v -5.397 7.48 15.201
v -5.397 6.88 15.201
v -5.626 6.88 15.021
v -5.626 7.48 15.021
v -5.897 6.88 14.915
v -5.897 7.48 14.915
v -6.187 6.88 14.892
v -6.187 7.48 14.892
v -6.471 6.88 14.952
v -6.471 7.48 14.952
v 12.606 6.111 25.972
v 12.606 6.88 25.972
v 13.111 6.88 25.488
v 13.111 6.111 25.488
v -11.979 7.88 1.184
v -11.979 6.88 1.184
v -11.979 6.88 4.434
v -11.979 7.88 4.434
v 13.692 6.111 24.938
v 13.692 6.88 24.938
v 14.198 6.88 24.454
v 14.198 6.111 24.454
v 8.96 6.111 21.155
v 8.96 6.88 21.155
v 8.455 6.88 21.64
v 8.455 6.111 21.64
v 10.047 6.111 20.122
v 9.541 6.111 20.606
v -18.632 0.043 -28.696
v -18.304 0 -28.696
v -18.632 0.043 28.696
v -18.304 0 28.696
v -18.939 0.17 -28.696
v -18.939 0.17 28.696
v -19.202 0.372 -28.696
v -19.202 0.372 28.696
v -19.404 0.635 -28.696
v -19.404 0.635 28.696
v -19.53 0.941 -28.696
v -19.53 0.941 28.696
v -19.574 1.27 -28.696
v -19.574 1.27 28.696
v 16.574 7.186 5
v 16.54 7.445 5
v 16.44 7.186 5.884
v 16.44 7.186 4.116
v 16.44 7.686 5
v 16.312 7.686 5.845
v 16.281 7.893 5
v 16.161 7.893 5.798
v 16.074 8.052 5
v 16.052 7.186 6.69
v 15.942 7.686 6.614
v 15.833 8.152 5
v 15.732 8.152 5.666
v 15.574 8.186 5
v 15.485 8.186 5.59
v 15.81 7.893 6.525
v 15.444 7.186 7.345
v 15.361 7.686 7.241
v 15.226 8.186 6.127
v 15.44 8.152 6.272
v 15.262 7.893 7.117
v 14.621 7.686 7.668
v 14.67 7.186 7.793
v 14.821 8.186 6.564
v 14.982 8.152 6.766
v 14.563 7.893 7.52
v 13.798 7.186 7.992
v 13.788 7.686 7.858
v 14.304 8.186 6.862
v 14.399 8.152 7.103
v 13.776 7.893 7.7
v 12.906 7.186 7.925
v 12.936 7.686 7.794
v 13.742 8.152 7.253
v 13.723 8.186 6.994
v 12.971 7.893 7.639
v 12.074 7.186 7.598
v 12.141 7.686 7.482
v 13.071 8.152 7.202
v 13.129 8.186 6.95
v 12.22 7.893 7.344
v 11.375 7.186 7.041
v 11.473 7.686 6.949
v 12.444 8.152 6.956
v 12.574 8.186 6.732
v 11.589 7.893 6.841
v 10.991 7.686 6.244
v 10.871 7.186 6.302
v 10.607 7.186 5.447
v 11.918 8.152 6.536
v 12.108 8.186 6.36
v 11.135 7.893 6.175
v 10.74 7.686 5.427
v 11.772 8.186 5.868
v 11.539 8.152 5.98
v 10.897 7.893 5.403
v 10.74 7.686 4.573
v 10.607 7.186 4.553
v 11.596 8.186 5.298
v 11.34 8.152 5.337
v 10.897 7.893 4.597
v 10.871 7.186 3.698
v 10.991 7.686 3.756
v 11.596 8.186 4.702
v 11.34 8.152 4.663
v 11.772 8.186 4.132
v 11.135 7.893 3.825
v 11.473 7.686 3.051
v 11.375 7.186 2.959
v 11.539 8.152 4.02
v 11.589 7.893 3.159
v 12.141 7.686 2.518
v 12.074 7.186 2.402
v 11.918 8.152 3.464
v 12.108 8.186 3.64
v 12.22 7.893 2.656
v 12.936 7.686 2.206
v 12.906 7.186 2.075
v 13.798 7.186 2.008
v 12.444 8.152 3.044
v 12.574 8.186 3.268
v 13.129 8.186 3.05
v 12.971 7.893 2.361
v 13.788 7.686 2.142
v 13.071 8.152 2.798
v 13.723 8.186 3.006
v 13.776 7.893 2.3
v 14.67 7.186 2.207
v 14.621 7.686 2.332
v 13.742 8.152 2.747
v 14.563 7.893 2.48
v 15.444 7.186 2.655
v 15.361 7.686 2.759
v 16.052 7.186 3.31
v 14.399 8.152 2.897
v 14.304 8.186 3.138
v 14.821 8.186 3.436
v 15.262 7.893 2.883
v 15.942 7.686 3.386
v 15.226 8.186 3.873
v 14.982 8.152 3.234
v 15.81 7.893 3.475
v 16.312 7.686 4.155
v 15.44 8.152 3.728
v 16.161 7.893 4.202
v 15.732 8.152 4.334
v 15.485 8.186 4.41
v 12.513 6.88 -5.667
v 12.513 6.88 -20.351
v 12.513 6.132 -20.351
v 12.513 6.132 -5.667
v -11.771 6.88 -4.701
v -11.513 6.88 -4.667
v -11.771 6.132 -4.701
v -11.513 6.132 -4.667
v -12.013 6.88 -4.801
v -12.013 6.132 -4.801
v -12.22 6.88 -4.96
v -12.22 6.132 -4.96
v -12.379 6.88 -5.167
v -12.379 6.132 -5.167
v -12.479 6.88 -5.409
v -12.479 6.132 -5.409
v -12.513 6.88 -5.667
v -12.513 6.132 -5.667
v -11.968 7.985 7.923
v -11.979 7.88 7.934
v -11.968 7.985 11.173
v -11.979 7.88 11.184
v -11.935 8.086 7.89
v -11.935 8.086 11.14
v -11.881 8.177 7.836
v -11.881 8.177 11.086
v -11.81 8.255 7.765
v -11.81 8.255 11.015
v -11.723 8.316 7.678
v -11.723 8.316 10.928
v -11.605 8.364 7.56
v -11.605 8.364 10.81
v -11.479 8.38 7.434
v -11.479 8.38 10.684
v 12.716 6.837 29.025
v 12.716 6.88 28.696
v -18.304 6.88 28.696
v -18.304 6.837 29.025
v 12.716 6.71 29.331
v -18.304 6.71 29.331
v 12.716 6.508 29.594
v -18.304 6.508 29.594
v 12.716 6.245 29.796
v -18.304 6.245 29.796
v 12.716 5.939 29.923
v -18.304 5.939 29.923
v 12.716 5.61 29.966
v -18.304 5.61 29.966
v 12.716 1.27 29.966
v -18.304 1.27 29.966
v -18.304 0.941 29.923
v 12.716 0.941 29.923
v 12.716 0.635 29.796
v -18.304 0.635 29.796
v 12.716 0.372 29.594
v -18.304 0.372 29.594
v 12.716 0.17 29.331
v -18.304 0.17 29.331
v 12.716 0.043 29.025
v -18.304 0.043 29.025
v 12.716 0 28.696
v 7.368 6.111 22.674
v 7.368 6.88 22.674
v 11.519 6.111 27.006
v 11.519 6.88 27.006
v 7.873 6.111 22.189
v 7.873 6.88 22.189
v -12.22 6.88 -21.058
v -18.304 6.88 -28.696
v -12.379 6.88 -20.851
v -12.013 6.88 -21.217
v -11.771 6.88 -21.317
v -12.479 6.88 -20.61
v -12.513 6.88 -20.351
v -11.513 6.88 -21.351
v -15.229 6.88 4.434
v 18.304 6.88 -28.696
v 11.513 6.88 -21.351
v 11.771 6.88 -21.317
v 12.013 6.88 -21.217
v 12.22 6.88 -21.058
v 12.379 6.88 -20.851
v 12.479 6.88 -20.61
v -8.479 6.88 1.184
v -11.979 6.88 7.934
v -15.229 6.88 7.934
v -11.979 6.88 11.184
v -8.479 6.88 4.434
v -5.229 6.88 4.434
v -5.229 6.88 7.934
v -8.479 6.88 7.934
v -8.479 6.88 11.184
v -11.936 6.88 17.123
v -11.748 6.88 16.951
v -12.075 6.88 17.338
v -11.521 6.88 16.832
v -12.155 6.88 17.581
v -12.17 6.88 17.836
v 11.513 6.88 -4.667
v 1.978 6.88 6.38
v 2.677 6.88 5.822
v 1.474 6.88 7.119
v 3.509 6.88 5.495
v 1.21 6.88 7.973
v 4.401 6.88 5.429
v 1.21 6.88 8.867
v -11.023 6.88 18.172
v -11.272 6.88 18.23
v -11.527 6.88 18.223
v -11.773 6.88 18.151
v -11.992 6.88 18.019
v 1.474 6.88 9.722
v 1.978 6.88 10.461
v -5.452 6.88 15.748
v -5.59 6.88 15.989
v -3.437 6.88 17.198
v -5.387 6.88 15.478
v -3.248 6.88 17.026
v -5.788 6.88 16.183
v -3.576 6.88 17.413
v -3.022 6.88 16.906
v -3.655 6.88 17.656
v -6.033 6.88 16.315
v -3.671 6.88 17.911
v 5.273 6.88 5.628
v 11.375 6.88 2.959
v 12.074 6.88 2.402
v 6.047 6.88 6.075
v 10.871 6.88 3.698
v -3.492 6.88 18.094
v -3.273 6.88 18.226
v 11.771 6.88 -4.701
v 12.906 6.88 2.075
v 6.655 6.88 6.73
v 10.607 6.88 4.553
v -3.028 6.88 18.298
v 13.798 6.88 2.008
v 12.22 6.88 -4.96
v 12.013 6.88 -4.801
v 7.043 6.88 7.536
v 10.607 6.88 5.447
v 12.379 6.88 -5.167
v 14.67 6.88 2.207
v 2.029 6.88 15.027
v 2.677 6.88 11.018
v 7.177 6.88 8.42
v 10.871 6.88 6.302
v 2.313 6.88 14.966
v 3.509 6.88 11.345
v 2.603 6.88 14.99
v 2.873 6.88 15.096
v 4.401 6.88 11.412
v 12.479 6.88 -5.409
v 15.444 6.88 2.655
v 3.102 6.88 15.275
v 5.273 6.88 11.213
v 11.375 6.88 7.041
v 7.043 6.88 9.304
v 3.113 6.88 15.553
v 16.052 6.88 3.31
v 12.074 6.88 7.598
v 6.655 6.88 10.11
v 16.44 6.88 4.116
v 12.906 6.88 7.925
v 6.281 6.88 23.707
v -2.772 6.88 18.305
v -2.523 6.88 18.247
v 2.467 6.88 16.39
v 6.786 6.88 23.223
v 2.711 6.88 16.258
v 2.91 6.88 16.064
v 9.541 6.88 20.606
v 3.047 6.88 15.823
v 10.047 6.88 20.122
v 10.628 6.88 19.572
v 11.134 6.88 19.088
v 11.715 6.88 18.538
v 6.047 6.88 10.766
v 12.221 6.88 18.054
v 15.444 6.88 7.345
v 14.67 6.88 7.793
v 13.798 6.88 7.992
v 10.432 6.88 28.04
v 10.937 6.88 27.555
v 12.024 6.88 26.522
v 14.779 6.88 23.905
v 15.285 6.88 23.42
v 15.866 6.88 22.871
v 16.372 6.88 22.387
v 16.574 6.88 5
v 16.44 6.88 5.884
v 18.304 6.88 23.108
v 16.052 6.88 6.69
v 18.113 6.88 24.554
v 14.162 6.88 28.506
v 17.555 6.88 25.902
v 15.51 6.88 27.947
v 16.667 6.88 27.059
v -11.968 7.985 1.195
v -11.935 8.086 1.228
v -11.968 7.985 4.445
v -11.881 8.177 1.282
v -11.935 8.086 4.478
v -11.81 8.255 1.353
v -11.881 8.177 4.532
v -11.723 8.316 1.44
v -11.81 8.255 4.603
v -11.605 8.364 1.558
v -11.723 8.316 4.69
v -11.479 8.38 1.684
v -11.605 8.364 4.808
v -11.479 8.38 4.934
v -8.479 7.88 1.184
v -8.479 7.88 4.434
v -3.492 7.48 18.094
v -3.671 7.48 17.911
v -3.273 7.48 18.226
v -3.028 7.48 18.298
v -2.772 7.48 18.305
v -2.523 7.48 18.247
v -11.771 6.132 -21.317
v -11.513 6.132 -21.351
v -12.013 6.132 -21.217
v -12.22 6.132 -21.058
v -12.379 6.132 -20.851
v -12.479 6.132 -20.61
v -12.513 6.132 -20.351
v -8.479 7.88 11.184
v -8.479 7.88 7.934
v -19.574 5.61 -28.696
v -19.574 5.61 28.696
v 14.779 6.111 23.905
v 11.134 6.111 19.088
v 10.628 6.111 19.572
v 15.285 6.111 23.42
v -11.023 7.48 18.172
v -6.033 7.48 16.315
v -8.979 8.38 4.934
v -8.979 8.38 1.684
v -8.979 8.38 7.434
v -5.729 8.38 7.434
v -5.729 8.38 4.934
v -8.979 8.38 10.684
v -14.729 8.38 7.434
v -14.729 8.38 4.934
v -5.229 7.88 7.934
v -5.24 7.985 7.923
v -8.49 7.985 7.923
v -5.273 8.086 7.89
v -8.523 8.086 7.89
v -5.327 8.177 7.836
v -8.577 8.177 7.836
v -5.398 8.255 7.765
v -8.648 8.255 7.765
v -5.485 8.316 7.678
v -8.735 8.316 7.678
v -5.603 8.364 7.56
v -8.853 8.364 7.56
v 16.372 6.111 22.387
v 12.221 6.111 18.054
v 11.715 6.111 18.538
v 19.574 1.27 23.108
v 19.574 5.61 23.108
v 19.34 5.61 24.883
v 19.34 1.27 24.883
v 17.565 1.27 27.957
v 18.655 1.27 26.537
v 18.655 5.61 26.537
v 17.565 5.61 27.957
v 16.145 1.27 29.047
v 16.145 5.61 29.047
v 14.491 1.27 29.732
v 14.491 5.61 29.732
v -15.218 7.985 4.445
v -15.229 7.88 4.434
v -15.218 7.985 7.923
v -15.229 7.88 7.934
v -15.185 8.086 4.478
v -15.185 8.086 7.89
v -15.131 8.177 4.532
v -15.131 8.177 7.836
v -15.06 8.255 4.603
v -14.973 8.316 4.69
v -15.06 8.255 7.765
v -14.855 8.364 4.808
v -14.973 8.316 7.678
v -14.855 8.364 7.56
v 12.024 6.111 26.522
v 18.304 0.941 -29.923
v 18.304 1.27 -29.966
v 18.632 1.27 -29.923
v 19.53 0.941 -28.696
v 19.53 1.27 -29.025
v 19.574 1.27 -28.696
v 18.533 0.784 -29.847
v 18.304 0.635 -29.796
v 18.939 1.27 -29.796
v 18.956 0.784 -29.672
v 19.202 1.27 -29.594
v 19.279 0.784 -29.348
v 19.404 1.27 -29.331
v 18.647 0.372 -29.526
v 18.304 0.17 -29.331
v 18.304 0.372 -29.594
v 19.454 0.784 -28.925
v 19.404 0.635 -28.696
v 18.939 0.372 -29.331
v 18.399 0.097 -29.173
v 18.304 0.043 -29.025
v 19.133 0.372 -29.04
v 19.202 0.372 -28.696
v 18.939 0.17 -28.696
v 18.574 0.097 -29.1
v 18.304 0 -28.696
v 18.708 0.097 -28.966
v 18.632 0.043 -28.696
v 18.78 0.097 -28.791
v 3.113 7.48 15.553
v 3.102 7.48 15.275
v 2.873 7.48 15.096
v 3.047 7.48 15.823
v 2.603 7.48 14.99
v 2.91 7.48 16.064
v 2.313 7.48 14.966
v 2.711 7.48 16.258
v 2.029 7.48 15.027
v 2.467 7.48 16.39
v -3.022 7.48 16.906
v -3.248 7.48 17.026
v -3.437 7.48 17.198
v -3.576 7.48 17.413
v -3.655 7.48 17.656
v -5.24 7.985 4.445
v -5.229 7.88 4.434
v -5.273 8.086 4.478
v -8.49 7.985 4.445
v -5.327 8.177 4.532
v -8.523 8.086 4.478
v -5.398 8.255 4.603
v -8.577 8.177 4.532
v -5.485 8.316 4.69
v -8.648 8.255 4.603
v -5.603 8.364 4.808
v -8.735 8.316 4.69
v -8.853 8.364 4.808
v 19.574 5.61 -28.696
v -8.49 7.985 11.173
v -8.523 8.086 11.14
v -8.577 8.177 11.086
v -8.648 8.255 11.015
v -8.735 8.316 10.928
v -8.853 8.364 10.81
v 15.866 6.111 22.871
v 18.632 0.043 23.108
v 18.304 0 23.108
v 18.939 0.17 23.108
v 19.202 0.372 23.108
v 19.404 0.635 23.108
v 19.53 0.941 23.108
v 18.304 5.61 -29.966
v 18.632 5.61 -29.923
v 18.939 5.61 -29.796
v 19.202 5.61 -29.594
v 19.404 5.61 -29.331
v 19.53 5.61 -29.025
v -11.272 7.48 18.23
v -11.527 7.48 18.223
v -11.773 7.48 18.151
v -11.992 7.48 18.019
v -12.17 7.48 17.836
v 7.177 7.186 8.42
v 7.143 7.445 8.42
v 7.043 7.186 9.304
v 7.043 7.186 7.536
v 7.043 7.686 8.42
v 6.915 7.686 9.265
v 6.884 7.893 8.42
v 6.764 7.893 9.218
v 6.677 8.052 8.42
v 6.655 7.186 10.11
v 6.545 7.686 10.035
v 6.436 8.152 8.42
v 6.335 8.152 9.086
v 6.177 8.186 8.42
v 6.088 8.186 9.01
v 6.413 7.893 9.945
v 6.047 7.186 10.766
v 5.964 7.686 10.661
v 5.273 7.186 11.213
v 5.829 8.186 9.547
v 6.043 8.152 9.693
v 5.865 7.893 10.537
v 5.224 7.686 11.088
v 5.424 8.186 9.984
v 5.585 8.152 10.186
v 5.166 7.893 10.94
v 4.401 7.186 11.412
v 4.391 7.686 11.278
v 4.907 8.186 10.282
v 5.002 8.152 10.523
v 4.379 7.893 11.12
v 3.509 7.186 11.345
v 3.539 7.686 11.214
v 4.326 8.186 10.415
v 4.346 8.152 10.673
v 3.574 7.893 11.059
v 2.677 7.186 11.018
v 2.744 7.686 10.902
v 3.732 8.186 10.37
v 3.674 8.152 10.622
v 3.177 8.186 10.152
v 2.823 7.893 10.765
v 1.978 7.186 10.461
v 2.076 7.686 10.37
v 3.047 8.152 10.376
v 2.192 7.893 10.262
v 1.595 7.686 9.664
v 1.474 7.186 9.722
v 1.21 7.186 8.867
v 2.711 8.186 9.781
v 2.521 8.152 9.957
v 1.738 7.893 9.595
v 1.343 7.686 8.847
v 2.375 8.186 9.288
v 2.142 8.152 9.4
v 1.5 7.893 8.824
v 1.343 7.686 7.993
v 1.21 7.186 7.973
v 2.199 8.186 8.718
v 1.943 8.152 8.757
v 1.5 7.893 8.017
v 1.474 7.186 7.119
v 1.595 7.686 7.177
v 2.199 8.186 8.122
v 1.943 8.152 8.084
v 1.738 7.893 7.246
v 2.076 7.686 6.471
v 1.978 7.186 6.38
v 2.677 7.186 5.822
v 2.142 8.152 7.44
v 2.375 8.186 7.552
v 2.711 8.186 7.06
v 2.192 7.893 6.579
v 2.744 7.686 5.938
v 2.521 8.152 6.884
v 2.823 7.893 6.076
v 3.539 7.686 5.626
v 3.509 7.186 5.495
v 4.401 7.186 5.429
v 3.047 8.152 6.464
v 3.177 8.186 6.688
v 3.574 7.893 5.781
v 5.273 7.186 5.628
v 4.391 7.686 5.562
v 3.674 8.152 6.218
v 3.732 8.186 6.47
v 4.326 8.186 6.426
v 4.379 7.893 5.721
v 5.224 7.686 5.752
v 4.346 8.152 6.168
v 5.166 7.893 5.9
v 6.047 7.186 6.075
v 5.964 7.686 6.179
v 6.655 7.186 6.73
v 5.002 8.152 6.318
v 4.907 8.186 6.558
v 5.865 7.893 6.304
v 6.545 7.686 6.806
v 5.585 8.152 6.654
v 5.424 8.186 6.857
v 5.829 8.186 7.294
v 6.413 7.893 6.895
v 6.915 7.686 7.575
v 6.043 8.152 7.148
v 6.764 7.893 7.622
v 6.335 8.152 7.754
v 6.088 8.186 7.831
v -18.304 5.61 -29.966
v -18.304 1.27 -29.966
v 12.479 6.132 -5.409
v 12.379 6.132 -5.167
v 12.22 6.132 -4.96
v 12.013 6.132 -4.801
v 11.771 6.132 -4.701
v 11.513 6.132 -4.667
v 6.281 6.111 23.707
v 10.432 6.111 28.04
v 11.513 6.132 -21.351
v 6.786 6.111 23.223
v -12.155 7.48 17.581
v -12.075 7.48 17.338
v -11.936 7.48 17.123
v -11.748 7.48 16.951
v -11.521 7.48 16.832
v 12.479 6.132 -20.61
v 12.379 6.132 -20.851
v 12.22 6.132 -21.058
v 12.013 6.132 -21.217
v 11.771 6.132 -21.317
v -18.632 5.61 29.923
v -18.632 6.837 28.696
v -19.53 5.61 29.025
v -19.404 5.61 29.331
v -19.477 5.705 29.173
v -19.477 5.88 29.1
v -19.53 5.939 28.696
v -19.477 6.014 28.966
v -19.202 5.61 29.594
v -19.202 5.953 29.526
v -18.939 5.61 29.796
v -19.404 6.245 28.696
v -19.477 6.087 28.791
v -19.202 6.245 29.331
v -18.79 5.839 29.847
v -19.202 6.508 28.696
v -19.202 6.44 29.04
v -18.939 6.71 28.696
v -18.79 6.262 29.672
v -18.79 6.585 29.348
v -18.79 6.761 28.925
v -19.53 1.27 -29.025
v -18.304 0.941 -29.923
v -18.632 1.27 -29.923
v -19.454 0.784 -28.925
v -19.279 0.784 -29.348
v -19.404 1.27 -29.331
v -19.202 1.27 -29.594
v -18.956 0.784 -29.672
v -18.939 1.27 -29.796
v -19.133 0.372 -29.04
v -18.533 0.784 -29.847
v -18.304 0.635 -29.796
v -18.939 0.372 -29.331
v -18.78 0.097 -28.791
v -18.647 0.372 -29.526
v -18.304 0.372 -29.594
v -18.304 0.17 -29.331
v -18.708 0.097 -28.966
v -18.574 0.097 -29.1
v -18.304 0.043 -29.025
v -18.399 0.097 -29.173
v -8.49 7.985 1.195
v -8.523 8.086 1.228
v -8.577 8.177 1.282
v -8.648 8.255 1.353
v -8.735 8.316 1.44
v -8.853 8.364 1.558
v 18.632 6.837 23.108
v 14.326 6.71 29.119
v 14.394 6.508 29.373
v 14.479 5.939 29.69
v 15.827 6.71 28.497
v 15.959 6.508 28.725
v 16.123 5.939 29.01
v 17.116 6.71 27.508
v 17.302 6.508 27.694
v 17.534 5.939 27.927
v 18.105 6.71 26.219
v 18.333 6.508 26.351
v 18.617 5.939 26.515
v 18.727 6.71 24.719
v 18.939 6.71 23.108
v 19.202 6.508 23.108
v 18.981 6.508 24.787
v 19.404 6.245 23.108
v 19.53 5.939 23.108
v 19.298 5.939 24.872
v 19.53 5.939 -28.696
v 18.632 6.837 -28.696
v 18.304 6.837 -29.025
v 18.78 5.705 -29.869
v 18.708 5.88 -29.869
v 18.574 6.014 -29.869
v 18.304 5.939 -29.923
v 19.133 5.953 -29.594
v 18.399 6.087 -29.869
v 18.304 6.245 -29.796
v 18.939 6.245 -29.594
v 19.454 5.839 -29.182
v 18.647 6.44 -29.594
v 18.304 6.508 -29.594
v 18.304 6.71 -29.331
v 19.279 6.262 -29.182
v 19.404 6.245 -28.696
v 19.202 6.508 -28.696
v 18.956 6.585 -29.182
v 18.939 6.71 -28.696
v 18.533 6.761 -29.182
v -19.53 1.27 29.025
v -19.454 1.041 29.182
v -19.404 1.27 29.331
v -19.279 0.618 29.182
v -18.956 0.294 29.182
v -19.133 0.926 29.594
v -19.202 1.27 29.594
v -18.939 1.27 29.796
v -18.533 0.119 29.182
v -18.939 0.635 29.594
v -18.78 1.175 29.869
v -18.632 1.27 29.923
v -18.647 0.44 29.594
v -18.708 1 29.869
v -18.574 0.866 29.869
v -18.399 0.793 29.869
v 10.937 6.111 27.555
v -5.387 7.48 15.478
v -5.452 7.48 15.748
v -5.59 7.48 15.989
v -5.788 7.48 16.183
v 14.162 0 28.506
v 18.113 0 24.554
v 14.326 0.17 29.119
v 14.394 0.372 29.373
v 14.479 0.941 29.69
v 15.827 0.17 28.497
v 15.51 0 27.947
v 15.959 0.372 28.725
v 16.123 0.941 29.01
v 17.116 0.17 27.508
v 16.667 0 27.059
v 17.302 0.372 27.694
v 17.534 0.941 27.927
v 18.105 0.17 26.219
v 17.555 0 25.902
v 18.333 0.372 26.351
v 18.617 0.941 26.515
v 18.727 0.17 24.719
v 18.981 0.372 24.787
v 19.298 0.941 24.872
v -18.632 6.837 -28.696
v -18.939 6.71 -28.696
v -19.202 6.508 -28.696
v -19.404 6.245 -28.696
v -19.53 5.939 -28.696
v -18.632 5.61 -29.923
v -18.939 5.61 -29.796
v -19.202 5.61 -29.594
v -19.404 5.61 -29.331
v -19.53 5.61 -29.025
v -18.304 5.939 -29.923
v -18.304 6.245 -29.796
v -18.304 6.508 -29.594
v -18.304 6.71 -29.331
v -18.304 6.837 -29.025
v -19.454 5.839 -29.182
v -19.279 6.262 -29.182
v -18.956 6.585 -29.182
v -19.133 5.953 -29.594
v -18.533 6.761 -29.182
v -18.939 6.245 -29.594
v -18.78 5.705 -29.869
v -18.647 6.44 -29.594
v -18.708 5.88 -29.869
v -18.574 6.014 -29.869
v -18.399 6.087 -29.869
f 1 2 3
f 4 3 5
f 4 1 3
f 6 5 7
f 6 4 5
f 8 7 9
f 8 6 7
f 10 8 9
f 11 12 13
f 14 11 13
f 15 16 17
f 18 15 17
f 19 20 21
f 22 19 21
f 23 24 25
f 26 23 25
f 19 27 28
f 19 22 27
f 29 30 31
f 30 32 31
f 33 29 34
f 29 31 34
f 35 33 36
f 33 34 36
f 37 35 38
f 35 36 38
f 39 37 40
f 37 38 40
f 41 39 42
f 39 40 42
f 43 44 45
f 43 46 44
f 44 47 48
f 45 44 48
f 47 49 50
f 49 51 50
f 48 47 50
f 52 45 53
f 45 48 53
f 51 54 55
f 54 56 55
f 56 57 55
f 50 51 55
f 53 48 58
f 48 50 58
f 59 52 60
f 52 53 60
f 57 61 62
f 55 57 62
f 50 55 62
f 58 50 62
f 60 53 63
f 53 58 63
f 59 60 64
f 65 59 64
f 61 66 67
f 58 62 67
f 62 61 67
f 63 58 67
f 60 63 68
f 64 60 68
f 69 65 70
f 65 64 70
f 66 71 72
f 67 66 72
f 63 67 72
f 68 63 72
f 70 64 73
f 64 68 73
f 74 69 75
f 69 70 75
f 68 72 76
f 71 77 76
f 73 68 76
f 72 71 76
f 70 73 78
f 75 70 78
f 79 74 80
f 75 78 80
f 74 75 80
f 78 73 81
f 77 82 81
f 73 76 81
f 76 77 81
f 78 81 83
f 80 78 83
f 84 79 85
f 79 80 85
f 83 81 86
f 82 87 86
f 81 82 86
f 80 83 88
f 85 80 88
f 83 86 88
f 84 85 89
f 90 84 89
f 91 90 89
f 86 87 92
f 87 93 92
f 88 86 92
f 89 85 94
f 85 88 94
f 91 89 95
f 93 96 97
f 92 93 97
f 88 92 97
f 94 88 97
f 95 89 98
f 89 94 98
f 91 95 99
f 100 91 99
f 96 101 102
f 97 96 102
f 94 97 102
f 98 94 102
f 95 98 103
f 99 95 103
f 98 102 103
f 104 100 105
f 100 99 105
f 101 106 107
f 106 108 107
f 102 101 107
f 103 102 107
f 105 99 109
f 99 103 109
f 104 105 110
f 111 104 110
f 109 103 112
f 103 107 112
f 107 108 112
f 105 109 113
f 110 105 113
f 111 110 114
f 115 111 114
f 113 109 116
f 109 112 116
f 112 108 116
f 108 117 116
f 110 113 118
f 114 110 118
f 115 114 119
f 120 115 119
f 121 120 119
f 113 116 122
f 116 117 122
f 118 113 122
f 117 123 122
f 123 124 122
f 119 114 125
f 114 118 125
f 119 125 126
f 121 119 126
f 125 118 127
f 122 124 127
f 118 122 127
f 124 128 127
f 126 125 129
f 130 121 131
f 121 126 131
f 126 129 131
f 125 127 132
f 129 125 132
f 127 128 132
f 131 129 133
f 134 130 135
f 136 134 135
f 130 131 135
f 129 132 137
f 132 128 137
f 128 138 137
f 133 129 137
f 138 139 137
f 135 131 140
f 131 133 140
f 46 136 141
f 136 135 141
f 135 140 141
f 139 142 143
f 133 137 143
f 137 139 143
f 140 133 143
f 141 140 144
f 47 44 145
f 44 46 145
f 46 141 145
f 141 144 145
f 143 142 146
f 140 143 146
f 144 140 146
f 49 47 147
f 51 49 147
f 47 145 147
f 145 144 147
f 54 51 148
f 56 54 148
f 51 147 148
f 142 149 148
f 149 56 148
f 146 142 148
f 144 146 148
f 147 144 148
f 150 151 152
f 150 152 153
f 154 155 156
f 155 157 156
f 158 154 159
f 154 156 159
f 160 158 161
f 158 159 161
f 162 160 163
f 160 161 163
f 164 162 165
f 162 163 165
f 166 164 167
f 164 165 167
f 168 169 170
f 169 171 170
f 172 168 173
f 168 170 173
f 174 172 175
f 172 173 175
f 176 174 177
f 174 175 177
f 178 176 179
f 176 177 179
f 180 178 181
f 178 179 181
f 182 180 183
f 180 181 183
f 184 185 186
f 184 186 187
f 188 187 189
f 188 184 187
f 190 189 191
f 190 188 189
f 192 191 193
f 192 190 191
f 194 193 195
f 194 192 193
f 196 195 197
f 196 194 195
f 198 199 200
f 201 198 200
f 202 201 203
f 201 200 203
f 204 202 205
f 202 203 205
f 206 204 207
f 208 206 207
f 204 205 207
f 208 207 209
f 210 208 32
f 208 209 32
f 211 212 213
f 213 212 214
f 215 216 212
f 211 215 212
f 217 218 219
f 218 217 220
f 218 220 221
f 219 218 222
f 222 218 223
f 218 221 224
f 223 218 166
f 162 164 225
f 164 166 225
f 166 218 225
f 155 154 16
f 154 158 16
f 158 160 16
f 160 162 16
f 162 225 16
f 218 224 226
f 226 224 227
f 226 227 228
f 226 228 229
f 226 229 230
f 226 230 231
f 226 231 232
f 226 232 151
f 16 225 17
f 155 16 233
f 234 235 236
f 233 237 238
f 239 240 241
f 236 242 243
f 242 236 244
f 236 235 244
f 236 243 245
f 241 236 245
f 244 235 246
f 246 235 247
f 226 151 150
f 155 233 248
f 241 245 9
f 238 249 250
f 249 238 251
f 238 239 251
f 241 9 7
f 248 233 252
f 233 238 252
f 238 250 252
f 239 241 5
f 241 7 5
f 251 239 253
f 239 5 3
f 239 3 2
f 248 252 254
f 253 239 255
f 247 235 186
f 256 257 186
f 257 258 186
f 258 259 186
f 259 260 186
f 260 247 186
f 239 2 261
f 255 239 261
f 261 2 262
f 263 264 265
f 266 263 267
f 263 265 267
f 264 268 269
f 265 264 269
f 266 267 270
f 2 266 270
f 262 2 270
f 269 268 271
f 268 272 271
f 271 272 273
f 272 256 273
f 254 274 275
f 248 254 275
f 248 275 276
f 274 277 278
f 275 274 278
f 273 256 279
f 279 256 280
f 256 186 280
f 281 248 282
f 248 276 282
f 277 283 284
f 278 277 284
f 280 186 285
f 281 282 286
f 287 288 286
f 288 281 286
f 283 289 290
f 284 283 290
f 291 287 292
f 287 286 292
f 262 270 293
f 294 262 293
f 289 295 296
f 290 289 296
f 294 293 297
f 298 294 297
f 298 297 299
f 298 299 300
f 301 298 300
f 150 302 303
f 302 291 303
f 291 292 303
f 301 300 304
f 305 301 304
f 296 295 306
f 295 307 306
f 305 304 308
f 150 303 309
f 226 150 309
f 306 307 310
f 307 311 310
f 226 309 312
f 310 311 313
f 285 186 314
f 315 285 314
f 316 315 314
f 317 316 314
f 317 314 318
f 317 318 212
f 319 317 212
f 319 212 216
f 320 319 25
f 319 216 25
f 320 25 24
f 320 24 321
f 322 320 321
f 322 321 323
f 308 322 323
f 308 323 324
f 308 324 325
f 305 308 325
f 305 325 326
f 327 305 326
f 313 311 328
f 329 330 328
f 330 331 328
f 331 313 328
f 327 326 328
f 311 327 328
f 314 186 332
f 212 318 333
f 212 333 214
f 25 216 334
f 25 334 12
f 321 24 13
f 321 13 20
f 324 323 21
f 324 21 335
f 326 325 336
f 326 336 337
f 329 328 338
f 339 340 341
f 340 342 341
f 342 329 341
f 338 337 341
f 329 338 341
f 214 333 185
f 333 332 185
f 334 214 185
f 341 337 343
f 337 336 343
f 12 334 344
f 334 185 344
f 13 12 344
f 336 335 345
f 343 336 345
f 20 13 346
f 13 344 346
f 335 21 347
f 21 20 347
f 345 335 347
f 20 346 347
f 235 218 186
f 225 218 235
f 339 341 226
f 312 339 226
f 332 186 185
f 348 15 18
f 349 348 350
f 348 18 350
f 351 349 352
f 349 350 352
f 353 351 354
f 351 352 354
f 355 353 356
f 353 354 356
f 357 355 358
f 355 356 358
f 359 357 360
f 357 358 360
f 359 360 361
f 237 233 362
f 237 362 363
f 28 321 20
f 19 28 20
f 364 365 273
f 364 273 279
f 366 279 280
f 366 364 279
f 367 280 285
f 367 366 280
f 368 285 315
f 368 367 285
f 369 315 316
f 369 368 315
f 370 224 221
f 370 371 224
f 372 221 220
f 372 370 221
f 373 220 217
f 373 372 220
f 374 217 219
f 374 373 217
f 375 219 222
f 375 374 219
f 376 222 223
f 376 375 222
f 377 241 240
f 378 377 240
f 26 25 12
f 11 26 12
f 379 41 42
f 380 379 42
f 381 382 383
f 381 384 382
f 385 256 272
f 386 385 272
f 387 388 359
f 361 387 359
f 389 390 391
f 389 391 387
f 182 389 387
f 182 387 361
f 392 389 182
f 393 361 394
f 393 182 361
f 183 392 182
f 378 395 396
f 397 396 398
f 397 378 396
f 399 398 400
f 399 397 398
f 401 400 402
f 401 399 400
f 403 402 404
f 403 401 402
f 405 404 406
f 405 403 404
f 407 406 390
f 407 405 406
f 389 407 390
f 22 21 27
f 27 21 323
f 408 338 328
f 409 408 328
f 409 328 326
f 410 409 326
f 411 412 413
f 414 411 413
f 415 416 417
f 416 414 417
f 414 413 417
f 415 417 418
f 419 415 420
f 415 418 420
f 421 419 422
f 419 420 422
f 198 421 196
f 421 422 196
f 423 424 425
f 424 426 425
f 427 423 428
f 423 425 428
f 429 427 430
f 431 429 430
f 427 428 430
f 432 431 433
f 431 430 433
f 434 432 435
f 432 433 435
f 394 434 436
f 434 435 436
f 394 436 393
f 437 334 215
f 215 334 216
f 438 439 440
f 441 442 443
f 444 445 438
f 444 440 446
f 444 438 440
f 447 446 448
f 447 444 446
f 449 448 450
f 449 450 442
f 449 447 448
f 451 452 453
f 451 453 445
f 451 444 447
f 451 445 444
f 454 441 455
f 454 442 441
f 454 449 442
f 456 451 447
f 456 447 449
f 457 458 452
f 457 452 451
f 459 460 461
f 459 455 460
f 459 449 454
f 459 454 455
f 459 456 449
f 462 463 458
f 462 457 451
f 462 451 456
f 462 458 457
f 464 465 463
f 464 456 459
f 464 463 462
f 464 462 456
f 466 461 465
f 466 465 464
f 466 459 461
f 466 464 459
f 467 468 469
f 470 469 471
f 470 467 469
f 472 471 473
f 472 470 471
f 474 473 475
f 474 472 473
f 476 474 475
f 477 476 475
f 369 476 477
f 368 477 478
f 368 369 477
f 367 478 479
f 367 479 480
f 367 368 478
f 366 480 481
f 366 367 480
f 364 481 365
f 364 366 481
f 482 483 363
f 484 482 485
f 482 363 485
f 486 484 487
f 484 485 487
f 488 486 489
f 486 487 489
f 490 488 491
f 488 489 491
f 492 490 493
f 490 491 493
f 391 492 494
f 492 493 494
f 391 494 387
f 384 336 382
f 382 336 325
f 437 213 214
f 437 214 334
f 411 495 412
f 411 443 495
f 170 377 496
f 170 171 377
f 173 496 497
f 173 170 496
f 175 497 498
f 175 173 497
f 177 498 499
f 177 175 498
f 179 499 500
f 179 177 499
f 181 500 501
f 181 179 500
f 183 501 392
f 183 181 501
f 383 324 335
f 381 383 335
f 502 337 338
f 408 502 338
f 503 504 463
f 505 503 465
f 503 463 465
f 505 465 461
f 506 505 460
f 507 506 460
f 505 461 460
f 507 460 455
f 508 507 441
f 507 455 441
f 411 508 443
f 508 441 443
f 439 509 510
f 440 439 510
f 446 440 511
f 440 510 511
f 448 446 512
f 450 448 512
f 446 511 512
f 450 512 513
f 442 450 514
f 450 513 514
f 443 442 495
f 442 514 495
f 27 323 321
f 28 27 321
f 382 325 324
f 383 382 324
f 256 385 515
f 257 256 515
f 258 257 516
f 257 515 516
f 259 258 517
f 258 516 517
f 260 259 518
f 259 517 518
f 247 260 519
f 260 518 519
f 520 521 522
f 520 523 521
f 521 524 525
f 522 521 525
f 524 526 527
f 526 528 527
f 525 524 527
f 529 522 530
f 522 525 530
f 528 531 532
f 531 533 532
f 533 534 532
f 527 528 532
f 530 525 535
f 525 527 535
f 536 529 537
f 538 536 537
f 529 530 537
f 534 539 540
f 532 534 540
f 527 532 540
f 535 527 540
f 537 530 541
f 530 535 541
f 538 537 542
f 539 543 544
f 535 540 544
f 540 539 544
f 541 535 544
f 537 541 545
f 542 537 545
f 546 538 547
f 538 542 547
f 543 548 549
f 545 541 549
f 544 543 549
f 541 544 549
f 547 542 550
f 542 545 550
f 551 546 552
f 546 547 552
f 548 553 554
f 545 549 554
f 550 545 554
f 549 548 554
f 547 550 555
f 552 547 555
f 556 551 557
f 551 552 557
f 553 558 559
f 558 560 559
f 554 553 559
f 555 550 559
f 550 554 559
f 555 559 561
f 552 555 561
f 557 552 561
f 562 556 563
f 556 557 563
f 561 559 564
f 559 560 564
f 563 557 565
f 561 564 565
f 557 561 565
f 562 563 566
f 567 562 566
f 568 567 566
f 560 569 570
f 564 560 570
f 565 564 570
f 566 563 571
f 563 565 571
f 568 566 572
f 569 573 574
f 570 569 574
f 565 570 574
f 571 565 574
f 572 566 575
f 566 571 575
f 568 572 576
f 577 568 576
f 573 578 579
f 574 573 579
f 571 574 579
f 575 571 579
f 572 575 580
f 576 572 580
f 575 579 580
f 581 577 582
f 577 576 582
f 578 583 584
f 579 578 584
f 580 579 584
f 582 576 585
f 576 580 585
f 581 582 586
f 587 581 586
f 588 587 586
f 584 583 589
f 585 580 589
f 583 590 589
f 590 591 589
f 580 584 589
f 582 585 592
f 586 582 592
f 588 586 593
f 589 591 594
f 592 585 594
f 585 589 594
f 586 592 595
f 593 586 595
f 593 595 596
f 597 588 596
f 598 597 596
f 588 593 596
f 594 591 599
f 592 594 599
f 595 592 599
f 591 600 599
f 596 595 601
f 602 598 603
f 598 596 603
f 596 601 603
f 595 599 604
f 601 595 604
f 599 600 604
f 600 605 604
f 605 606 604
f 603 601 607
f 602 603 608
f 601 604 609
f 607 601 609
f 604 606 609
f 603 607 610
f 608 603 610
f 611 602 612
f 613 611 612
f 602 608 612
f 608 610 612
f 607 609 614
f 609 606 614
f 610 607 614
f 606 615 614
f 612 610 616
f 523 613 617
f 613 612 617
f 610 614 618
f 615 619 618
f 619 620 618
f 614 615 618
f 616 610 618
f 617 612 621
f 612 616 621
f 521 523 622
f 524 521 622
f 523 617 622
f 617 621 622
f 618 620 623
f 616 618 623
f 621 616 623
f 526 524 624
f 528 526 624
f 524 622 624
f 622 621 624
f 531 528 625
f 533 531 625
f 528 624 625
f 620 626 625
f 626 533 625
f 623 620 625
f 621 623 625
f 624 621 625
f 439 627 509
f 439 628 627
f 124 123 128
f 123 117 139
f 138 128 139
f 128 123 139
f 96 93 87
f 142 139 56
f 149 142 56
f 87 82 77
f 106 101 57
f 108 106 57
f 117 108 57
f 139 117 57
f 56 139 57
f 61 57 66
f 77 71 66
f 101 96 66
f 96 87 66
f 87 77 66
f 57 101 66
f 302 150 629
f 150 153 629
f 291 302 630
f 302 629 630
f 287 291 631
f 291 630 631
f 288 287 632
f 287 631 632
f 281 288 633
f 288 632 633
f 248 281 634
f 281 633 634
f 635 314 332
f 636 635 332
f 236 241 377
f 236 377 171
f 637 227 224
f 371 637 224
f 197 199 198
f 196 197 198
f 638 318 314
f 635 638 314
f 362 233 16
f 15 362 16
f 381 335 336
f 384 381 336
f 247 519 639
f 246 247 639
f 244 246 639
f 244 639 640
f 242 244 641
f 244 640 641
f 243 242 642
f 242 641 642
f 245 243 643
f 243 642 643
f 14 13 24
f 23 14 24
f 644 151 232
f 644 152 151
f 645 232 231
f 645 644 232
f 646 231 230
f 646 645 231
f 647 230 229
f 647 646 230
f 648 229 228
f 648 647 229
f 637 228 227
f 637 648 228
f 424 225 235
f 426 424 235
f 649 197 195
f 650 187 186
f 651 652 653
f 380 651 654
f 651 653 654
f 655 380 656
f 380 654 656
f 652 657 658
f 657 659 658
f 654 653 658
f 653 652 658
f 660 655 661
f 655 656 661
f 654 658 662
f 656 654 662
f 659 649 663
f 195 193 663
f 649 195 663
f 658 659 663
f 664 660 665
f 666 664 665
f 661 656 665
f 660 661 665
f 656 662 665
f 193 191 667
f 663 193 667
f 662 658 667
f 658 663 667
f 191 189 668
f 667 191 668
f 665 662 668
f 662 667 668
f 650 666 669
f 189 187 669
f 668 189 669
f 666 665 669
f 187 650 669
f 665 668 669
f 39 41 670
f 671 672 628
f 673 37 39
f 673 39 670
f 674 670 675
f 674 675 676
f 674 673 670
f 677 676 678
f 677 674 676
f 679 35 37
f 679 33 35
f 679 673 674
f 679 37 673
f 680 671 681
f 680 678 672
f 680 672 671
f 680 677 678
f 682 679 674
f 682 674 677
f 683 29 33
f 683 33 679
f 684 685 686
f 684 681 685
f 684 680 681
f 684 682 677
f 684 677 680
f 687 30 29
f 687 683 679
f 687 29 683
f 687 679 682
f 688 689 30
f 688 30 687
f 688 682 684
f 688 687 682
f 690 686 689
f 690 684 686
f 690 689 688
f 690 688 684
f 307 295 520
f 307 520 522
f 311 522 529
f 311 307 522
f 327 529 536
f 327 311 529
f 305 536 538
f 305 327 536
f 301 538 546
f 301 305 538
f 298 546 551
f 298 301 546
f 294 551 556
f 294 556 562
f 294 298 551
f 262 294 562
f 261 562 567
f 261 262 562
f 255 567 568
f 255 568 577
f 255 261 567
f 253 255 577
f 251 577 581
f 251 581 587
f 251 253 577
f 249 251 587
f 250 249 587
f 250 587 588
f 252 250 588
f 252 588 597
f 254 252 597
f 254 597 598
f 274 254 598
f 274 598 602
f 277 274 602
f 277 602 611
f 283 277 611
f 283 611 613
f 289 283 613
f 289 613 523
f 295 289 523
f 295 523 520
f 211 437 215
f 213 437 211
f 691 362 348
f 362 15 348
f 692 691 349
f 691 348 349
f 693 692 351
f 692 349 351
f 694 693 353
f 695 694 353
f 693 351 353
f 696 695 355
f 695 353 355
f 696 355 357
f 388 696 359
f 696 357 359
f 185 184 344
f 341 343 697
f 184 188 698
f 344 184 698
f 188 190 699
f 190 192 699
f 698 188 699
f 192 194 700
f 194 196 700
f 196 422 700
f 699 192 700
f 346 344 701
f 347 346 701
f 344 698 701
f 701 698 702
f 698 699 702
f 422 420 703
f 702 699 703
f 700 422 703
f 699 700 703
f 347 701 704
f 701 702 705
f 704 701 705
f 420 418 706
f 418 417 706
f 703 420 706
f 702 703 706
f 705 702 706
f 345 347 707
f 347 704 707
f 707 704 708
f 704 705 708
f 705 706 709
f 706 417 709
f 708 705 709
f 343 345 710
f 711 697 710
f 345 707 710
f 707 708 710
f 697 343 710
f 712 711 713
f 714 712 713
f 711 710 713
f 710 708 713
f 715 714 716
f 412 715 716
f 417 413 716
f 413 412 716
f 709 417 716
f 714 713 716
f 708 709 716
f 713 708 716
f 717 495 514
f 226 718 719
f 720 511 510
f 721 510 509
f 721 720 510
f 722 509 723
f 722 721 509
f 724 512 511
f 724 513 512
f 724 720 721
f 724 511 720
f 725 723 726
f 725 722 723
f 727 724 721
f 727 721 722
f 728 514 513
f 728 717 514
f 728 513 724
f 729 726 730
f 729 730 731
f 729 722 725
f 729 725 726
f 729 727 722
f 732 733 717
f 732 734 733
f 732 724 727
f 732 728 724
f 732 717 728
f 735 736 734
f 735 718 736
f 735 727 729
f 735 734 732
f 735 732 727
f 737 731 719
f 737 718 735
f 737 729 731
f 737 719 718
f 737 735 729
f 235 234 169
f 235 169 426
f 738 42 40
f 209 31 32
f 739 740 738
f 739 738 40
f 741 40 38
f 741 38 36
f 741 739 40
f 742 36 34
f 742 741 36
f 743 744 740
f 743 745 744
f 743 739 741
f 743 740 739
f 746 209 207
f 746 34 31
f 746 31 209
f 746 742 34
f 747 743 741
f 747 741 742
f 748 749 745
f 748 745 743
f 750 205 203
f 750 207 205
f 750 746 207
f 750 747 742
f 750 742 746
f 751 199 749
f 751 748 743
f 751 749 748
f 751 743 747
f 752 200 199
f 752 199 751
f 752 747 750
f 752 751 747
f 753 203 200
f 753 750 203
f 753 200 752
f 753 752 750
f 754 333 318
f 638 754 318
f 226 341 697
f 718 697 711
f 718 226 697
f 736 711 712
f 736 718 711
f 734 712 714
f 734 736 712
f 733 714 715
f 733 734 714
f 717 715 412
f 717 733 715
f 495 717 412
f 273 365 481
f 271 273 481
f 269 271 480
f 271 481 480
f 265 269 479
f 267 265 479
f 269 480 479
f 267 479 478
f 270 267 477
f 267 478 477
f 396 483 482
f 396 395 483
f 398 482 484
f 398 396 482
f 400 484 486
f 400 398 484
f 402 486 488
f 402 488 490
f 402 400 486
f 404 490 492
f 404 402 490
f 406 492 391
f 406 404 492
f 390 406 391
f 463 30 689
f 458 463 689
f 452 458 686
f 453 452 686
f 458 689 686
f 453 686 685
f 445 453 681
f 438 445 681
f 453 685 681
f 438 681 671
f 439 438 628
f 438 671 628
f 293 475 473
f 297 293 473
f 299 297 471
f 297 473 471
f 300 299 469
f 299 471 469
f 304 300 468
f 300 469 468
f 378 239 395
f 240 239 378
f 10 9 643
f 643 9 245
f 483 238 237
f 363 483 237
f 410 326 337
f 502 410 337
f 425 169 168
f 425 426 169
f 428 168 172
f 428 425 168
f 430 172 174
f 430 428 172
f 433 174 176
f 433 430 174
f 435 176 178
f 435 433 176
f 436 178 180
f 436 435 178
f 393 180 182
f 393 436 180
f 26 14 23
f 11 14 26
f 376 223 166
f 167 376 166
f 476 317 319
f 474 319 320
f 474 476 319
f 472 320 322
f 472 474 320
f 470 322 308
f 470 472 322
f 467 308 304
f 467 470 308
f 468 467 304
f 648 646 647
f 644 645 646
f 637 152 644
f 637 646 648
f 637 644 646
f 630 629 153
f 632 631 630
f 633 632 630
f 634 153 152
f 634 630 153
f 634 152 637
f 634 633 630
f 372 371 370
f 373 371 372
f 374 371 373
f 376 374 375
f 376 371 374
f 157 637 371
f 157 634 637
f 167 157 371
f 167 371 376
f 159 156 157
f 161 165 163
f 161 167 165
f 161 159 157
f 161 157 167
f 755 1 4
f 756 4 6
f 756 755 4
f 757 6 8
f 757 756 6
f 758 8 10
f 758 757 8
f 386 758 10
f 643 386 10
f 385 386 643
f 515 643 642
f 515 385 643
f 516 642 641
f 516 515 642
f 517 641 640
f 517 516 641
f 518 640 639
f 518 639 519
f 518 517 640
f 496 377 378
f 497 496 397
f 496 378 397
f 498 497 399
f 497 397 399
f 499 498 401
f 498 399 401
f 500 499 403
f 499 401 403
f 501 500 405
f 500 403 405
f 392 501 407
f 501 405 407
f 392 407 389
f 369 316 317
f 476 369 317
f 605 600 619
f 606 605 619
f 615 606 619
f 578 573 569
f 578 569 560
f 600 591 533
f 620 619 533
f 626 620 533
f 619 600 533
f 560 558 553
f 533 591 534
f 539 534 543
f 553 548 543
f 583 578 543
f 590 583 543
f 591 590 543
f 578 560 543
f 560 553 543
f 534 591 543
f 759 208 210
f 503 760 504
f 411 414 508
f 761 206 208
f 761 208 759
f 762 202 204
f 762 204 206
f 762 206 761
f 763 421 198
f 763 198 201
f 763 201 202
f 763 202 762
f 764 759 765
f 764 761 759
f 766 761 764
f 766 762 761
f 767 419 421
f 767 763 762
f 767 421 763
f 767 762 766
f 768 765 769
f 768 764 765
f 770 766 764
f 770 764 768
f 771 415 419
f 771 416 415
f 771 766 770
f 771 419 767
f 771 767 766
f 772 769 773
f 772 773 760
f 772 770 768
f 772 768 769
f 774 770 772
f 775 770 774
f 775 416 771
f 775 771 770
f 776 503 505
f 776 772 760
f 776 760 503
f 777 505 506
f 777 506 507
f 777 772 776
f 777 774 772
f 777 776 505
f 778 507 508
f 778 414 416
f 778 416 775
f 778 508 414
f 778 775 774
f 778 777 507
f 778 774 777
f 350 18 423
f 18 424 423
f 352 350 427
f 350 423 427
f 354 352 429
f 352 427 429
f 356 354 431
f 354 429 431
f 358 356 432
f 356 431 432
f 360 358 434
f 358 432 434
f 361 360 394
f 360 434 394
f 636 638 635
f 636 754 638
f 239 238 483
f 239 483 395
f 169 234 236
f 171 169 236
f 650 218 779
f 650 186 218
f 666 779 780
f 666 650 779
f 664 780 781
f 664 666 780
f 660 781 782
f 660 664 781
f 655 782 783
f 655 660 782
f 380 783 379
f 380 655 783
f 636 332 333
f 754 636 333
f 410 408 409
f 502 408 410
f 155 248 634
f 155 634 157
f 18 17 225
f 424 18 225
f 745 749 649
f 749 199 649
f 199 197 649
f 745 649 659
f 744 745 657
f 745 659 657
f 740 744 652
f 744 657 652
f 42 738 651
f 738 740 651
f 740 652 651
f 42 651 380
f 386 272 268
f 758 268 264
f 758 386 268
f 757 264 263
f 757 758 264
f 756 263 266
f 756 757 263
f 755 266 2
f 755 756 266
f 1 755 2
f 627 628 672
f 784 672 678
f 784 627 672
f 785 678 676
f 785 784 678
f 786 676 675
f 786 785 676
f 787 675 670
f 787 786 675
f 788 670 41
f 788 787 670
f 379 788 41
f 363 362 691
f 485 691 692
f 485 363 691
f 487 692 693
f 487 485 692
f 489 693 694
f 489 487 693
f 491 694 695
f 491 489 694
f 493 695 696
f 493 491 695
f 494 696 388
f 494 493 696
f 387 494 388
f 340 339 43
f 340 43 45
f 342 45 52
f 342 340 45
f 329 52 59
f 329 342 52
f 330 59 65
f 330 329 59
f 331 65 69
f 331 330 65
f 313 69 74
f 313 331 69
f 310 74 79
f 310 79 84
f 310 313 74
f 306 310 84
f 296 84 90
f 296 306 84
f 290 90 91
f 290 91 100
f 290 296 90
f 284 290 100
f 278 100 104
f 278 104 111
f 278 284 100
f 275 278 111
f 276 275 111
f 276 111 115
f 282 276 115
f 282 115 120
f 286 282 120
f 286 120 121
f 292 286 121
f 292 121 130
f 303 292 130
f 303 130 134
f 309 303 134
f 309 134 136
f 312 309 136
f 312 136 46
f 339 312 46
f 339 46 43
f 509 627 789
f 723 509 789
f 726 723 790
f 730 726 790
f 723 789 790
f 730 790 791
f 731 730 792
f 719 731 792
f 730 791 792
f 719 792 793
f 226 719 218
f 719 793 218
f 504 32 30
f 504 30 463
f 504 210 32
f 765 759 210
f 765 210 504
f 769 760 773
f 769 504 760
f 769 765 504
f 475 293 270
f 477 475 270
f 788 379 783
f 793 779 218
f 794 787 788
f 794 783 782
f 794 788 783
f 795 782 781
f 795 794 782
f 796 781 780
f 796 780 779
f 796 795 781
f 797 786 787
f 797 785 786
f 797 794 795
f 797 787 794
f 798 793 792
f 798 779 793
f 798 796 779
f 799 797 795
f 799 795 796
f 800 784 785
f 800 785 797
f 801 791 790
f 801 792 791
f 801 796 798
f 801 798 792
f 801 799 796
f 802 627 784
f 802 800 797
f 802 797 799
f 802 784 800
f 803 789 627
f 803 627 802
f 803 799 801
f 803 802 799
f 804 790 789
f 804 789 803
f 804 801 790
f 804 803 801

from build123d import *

# Parameters (mm, degrees)
F0_W         = 39.1473919153
F0_H         = 59.931833297
F1_DEPTH     = 6.87984
F2_R         = 6.858
F3_R         = 1.27
F4_T1_DEPTH  = 31.0193919153
F4_T3_DEPTH  = 36.6073919153
F4_T5_DEPTH  = 4.33984
F4_T7_DEPTH  = 51.803833297
F4_S11_W     = 1.27
F4_S11_H     = 1.27
F4_T12_DEPTH = 1.27
F4_S17_W     = 1.27
F4_S17_H     = 1.27
F4_T18_DEPTH = 1.27
F4_S23_W     = 1.27
F4_S23_H     = 1.27
F4_T24_DEPTH = 1.27
F4_S29_W     = 1.27
F4_S29_H     = 1.27
F4_T30_DEPTH = 1.27
F4_T34_ANGLE = 90
F4_T36_ANGLE = 90
F5_R         = 3
F6_DEPTH     = 8.18637
F7_R         = 1
F8_W         = 3.5
F8_H         = 3.25
F8_H_2       = 3.5
F8_W_2       = 3.25
F9_DEPTH     = 1.5
F10_R        = 0.5
F11_W        = 25.0252205878
F11_H        = 16.683479771
F12_DEPTH    = 0.74821
F14_DEPTH    = 0.76923
F16_DEPTH    = 0.6
F17_DEPTH    = 0.6
F18_T1_DEPTH = 2.831936667
F18_T3_DEPTH = 3.1
F18_T5_DEPTH = 3.4002586688
F19_T1_DEPTH = 3.1
F19_T3_DEPTH = 3.4002586688
F19_T5_DEPTH = 2.831936667
F20_R        = 1
F21_R        = 1
F22_R        = 1


# Not quite as in the source:
# - a fillet or chamfer that OpenCascade refuses, or shapes differently, is made with other operations: its cross-section is extruded or revolved along the edge and cut away or added


with BuildPart() as f1:
    # F0 (on Front) → F1 (new body)
    with BuildSketch(Plane.XZ):
        Rectangle(F0_W, F0_H)
    extrude(amount=-F1_DEPTH)

    # F2
    f2_edges = [f1.edges().sort_by_distance(p)[0] for p in [
        (19.573696, 3.43992, 29.965917),
    ]]
    fillet(f2_edges, radius=F2_R)

    # F3
    f3_edges = [f1.edges().sort_by_distance(p)[0] for p in [
        (-3.429, 6.87984, 29.965917),
        (-19.573696, 3.43992, 29.965917),
        (-19.573696, 3.43992, -29.965917),
        (-19.573696, 6.87984, 0),
        (-19.573696, 0, 0),
    ]]
    fillet(f3_edges, radius=F3_R)

    # F4: fillet of radius 1.27 on 3 edges, made by hand

    # F4_s2 → F4_t1 (cut)
    with BuildSketch(Plane.YZ.offset(-18.3036959577)):
        with BuildLine():
            ThreePointArc((1.27, 29.9659166485), (0.3719743879, 29.5939422606), (0, 28.6959166485))
            Line((0, 28.6959166485), (0, 29.9659166485))
            Line((0, 29.9659166485), (1.27, 29.9659166485))
        make_face()
    extrude(amount=F4_T1_DEPTH, mode=Mode.SUBTRACT)

    # F4_s4 → F4_t3 (cut)
    with BuildSketch(Plane.YZ.offset(-18.3036959577)):
        with BuildLine():
            ThreePointArc((5.60984, -29.9659166485), (6.5078656121, -29.5939422606), (6.87984, -28.6959166485))
            Line((6.87984, -28.6959166485), (6.87984, -29.9659166485))
            Line((6.87984, -29.9659166485), (5.60984, -29.9659166485))
        make_face()
        with BuildLine():
            ThreePointArc((0, -28.6959166485), (0.3719743879, -29.5939422606), (1.27, -29.9659166485))
            Line((1.27, -29.9659166485), (0, -29.9659166485))
            Line((0, -29.9659166485), (0, -28.6959166485))
        make_face()
    extrude(amount=F4_T3_DEPTH, mode=Mode.SUBTRACT)

    # F4_s6 → F4_t5 (cut)
    with BuildSketch(Plane.XZ.offset(-5.60984)):
        with BuildLine():
            ThreePointArc((18.3036959577, -29.9659166485), (19.2017215698, -29.5939422606), (19.5736959577, -28.6959166485))
            Line((19.5736959577, -28.6959166485), (19.5736959577, -29.9659166485))
            Line((19.5736959577, -29.9659166485), (18.3036959577, -29.9659166485))
        make_face()
    extrude(amount=F4_T5_DEPTH, mode=Mode.SUBTRACT)

    # F4_s8 → F4_t7 (cut)
    with BuildSketch(Plane.XY.offset(-28.6959166485)):
        with BuildLine():
            ThreePointArc((18.3036959577, 0), (19.2017215698, 0.3719743879), (19.5736959577, 1.27))
            Line((19.5736959577, 1.27), (19.5736959577, 0))
            Line((19.5736959577, 0), (18.3036959577, 0))
        make_face()
    extrude(amount=F4_T7_DEPTH, mode=Mode.SUBTRACT)


with BuildPart() as f4_tool10:
    # F4_s11 → F4_t12 (new body)
    with BuildSketch(Plane.XZ.offset(-1.27)):
        with Locations((-18.9386959577, -29.3309166485)):
            Rectangle(F4_S11_W, F4_S11_H)
    extrude(amount=F4_T12_DEPTH)

    # F4_s13 → F4_t14 (revolve, cut)
    with BuildSketch(Plane(origin=(-18.3036959577, 1.27, -28.6959166485), x_dir=(0.7071067812, 0, 0.7071067812), z_dir=(0.7071067812, 0, -0.7071067812))):
        with BuildLine():
            ThreePointArc((0, -1.27), (1.27, 0), (0, 1.27))
            Line((0, 1.27), (0, -1.27))
        make_face()
    revolve(axis=Axis((-18.3036959577, 1.27, -28.6959166485), (0, -1, 0)), mode=Mode.SUBTRACT)


with BuildPart() as f1_1:
    add(f1.part)

    # F4_t9: cut F4_tool10
    add(f4_tool10.part, mode=Mode.SUBTRACT)


with BuildPart() as f4_tool16:
    # F4_s17 → F4_t18 (new body)
    with BuildSketch(Plane.XY.offset(-28.6959166485)):
        with Locations((-18.9386959577, 6.24484)):
            Rectangle(F4_S17_W, F4_S17_H)
    extrude(amount=-F4_T18_DEPTH)

    # F4_s19 → F4_t20 (revolve, cut)
    with BuildSketch(Plane(origin=(-18.3036959577, 5.60984, -28.6959166485), x_dir=(0.7071067812, -0.7071067812, 0), z_dir=(0.7071067812, 0.7071067812, 0))):
        with BuildLine():
            ThreePointArc((0, -1.27), (1.27, 0), (0, 1.27))
            Line((0, 1.27), (0, -1.27))
        make_face()
    revolve(axis=Axis((-18.3036959577, 5.60984, -28.6959166485), (0, 0, -1)), mode=Mode.SUBTRACT)


with BuildPart() as f1_2:
    add(f1_1.part)

    # F4_t15: cut F4_tool16
    add(f4_tool16.part, mode=Mode.SUBTRACT)


with BuildPart() as f4_tool22:
    # F4_s23 → F4_t24 (new body)
    with BuildSketch(Plane.XY.offset(28.6959166485)):
        with Locations((-18.9386959577, 0.635)):
            Rectangle(F4_S23_W, F4_S23_H)
    extrude(amount=F4_T24_DEPTH)

    # F4_s25 → F4_t26 (revolve, cut)
    with BuildSketch(Plane(origin=(-18.3036959577, 1.27, 28.6959166485), x_dir=(0.7071067812, 0.7071067812, 0), z_dir=(0.7071067812, -0.7071067812, 0))):
        with BuildLine():
            ThreePointArc((0, -1.27), (1.27, 0), (0, 1.27))
            Line((0, 1.27), (0, -1.27))
        make_face()
    revolve(axis=Axis((-18.3036959577, 1.27, 28.6959166485), (0, 0, 1)), mode=Mode.SUBTRACT)


with BuildPart() as f1_3:
    add(f1_2.part)

    # F4_t21: cut F4_tool22
    add(f4_tool22.part, mode=Mode.SUBTRACT)


with BuildPart() as f4_tool28:
    # F4_s29 → F4_t30 (new body)
    with BuildSketch(Plane.XZ.offset(-1.27)):
        with Locations((18.9386959577, -29.3309166485)):
            Rectangle(F4_S29_W, F4_S29_H)
    extrude(amount=F4_T30_DEPTH)

    # F4_s31 → F4_t32 (revolve, cut)
    with BuildSketch(Plane(origin=(18.3036959577, 1.27, -28.6959166485), x_dir=(-0.7071067812, 0, 0.7071067812), z_dir=(0.7071067812, 0, 0.7071067812))):
        with BuildLine():
            ThreePointArc((0, -1.27), (1.27, 0), (0, 1.27))
            Line((0, 1.27), (0, -1.27))
        make_face()
    revolve(axis=Axis((18.3036959577, 1.27, -28.6959166485), (0, -1, 0)), mode=Mode.SUBTRACT)


with BuildPart() as f1_4:
    add(f1_3.part)

    # F4_t27: cut F4_tool28
    add(f4_tool28.part, mode=Mode.SUBTRACT)

    # F4_s33 → F4_t34 (revolve, cut)
    with BuildSketch(Plane.XZ.offset(-5.60984)):
        with BuildLine():
            ThreePointArc((18.3036959577, -29.9659166485), (19.2017215698, -29.5939422606), (19.5736959577, -28.6959166485))
            Line((19.5736959577, -28.6959166485), (19.5736959577, -29.9659166485))
            Line((19.5736959577, -29.9659166485), (18.3036959577, -29.9659166485))
        make_face()
    revolve(axis=Axis((18.3036959577, 5.60984, -29.9659166485), (0, 0, 1)), revolution_arc=F4_T34_ANGLE, mode=Mode.SUBTRACT)

    # F4_s35 → F4_t36 (revolve, cut)
    with BuildSketch(Plane.YZ.offset(12.7156959577)):
        with BuildLine():
            ThreePointArc((0, 28.6959166485), (0.3719743879, 29.5939422606), (1.27, 29.9659166485))
            Line((1.27, 29.9659166485), (0, 29.9659166485))
            Line((0, 29.9659166485), (0, 28.6959166485))
        make_face()
    revolve(axis=Axis((12.7156959577, 0, 23.1079166485), (0, 1, 0)), revolution_arc=F4_T36_ANGLE, mode=Mode.SUBTRACT)

    # F5 (on Front) → F6 (join)
    with BuildSketch(Plane.XZ):
        with Locations((13.5736959577, 5)):
            Circle(F5_R)
        with Locations((4.1767697498, 8.4202014333)):
            Circle(F5_R)
    extrude(amount=-F6_DEPTH)

    # F7
    f7_edges = [f1_4.edges().sort_by_distance(p)[0] for p in [
        (1.17677, 8.18637, 8.420201),
        (10.573696, 8.18637, 5),
    ]]
    fillet(f7_edges, radius=F7_R)

    # F8 (on face) → F9 (join)
    with BuildSketch(Plane(origin=(0, 6.87984, 0), x_dir=(-1, 0, 0), z_dir=(0, 1, 0))):
        with Locations((10.2288695052, 9.5590941198)):
            Rectangle(F8_W, F8_H)
        with Locations((10.2288695052, 6.1840941198)):
            Rectangle(F8_W, F8_H_2)
        with Locations((6.8538695052, 6.1840941198)):
            Rectangle(F8_W_2, F8_H_2)
        with Locations((13.6038695052, 6.1840941198)):
            Rectangle(F8_W_2, F8_H_2)
        with Locations((10.2288695052, 2.8090941198)):
            Rectangle(F8_W, F8_H)
    extrude(amount=F9_DEPTH)

    # F10
    f10_edges = [f1_4.edges().sort_by_distance(p)[0] for p in [
        (-8.47887, 8.37984, 9.559094),
        (-6.85387, 8.37984, 7.934094),
        (-5.22887, 8.37984, 6.184094),
        (-6.85387, 8.37984, 4.434094),
        (-8.47887, 8.37984, 2.809094),
        (-10.22887, 8.37984, 1.184094),
        (-11.97887, 8.37984, 2.809094),
        (-13.60387, 8.37984, 4.434094),
        (-15.22887, 8.37984, 6.184094),
        (-13.60387, 8.37984, 7.934094),
        (-11.97887, 8.37984, 9.559094),
        (-10.22887, 8.37984, 11.184094),
    ]]
    fillet(f10_edges, radius=F10_R)

    # F11 (on face) → F12 (cut)
    with BuildSketch(Plane(origin=(0, 6.87984, 0), x_dir=(-1, 0, 0), z_dir=(0, 1, 0))):
        with Locations((0, -13.0091430619)):
            Rectangle(F11_W, F11_H)
    extrude(amount=-F12_DEPTH, mode=Mode.SUBTRACT)

    # F13 (on face) → F14 (cut)
    with BuildSketch(Plane(origin=(0, 6.87984, 0), x_dir=(-1, 0, 0), z_dir=(0, 1, 0))):
        Polygon((-15.8662368542, 22.8707954266), (-16.3716748357, 22.3865099251), (-12.2206562519, 18.0541843698), (-11.7152182705, 18.5384698712), align=None)
        Polygon((-11.1337694753, 19.0879527843), (-10.6283314938, 19.5722382857), (-14.7793500776, 23.904563841), (-15.284788059, 23.4202783396), align=None)
        Polygon((-10.0468826986, 20.1217211988), (-9.5414447172, 20.6060067002), (-13.6924633009, 24.9383322555), (-14.1979012824, 24.4540467541), align=None)
        Polygon((-8.959995922, 21.1554896132), (-8.4545579406, 21.6397751147), (-12.6055765243, 25.97210067), (-13.1110145058, 25.4878151686), align=None)
        Polygon((-7.8731091454, 22.1892580277), (-7.3676711639, 22.6735435291), (-11.5186897477, 27.0058690845), (-12.0241277291, 26.521583583), align=None)
        Polygon((-6.7862223687, 23.2230264422), (-6.2807843873, 23.7073119436), (-10.431802971, 28.0396374989), (-10.9372409525, 27.5553519975), align=None)
    extrude(amount=-F14_DEPTH, mode=Mode.SUBTRACT)

    # F15 (on face) → F16 (join)
    with BuildSketch(Plane(origin=(0, 6.87984, 0), x_dir=(-1, 0, 0), z_dir=(0, 1, 0))):
        Polygon((4.9829966579, 15.9248658988), (5.6341970339, 14.6409766749), (12.4587174505, 17.180332914), (11.9598941685, 18.5209205872), align=None)
    extrude(amount=F16_DEPTH)

    # F15 (on face) → F17 (join)
    with BuildSketch(Plane(origin=(0, 6.87984, 0), x_dir=(-1, 0, 0), z_dir=(0, 1, 0))):
        Polygon((4.9829966579, 15.9248658988), (5.6341970339, 14.6409766749), (12.4587174505, 17.180332914), (11.9598941685, 18.5209205872), align=None)
        Polygon((-3.5166739851, 15.999692095), (-2.8654736091, 14.715802871), (3.9590468074, 17.2551591101), (3.4602235255, 18.5957467833), align=None)
    extrude(amount=F17_DEPTH)

    # F18: fillet of radius 1 on 4 edges, made by hand

    # F18_s2 → F18_t1 (cut)
    with BuildSketch(Plane.XZ.offset(-9.711776667)):
        with BuildLine():
            ThreePointArc((-5.2303506466, 15.4371893983), (-5.7581630774, 14.9581512114), (-6.4709249675, 14.9523172774))
            Line((-6.4709249675, 14.9523172774), (-5.6341970339, 14.6409766749))
            Line((-5.6341970339, 14.6409766749), (-5.2303506466, 15.4371893983))
        make_face()
    extrude(amount=F18_T1_DEPTH, mode=Mode.SUBTRACT)

    # F18_s4 → F18_t3 (cut)
    with BuildSketch(Plane.XZ.offset(-9.97984)):
        with BuildLine():
            ThreePointArc((-12.109983762, 18.1175547738), (-12.0820697907, 17.3526971087), (-11.5214955907, 16.8315992255))
            Line((-11.5214955907, 16.8315992255), (-12.4587174505, 17.180332914))
            Line((-12.4587174505, 17.180332914), (-12.109983762, 18.1175547738))
        make_face()
        with BuildLine():
            ThreePointArc((-11.0226723087, 18.1721868987), (-11.7875299738, 18.1442729274), (-12.308627857, 17.5836987274))
            Line((-12.308627857, 17.5836987274), (-11.9598941685, 18.5209205872))
            Line((-11.9598941685, 18.5209205872), (-11.0226723087, 18.1721868987))
        make_face()
    extrude(amount=F18_T3_DEPTH, mode=Mode.SUBTRACT)

    # F18_s6 → F18_t5 (cut)
    with BuildSketch(Plane.XZ.offset(-10.2800986688)):
        with BuildLine():
            ThreePointArc((-6.032782113, 16.3154837126), (-5.4501278756, 15.7422900544), (-5.489675169, 14.9259121139))
            Line((-5.489675169, 14.9259121139), (-4.9829966579, 15.9248658988))
            Line((-4.9829966579, 15.9248658988), (-6.032782113, 16.3154837126))
        make_face()
    extrude(amount=F18_T5_DEPTH, mode=Mode.SUBTRACT)

    # F19: fillet of radius 1 on 4 edges, made by hand

    # F19_s2 → F19_t1 (cut)
    with BuildSketch(Plane.XZ.offset(-9.97984)):
        with BuildLine():
            ThreePointArc((-3.808957214, 17.6585249235), (-3.2878593307, 18.2190991235), (-2.5230016657, 18.2470130948))
            Line((-2.5230016657, 18.2470130948), (-3.4602235255, 18.5957467833))
            Line((-3.4602235255, 18.5957467833), (-3.808957214, 17.6585249235))
        make_face()
        with BuildLine():
            ThreePointArc((-3.6103131189, 18.1923809699), (-3.5823991476, 17.4275233048), (-3.0218249476, 16.9064254216))
            Line((-3.0218249476, 16.9064254216), (-3.9590468074, 17.2551591101))
            Line((-3.9590468074, 17.2551591101), (-3.6103131189, 18.1923809699))
        make_face()
    extrude(amount=F19_T1_DEPTH, mode=Mode.SUBTRACT)

    # F19_s4 → F19_t3 (cut)
    with BuildSketch(Plane.XZ.offset(-10.2800986688)):
        with BuildLine():
            ThreePointArc((2.4668885301, 16.3903099087), (3.0495427674, 15.8171162505), (3.0099954741, 15.00073831))
            Line((3.0099954741, 15.00073831), (3.5166739851, 15.999692095))
            Line((3.5166739851, 15.999692095), (2.4668885301, 16.3903099087))
        make_face()
    extrude(amount=F19_T3_DEPTH, mode=Mode.SUBTRACT)

    # F19_s6 → F19_t5 (cut)
    with BuildSketch(Plane.XZ.offset(-9.711776667)):
        with BuildLine():
            ThreePointArc((2.0287456755, 15.0271434735), (2.7415075656, 15.0329774075), (3.2693199965, 15.5120155945))
            Line((3.2693199965, 15.5120155945), (2.8654736091, 14.715802871))
            Line((2.8654736091, 14.715802871), (2.0287456755, 15.0271434735))
        make_face()
    extrude(amount=F19_T5_DEPTH, mode=Mode.SUBTRACT)

    # F20
    f20_edges = [f1_4.edges().sort_by_distance(p)[0] for p in [
        (12.51261, 6.505735, -21.350883),
    ]]
    fillet(f20_edges, radius=F20_R)

    # F21
    f21_edges = [f1_4.edges().sort_by_distance(p)[0] for p in [
        (12.51261, 6.505735, -4.667403),
    ]]
    fillet(f21_edges, radius=F21_R)

    # F22
    f22_edges = [f1_4.edges().sort_by_distance(p)[0] for p in [
        (-12.51261, 6.505735, -4.667403),
        (-12.51261, 6.505735, -21.350883),
    ]]
    fillet(f22_edges, radius=F22_R)


solid = f1_4.part
